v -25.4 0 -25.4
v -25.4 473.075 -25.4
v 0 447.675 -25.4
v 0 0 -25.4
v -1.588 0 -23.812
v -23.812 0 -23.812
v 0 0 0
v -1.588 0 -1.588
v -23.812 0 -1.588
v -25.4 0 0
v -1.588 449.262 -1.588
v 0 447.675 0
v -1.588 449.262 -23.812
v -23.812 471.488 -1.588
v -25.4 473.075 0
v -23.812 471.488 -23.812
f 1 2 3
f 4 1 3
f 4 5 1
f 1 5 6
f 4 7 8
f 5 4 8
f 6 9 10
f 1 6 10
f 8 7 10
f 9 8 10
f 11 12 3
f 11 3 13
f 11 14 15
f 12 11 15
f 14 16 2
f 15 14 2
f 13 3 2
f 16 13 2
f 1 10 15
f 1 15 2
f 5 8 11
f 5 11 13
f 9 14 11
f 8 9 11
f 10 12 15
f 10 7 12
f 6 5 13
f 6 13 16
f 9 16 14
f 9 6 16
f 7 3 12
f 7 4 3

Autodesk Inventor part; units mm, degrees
ref_plane "YZ Plane" through (0, 0, 0) normal (1, 0, 0) x (0, 1, 0)
ref_plane "XZ Plane" through (0, 0, 0) normal (0, 1, 0) x (-1, 0, 0)
ref_plane "XY Plane" through (0, 0, 0) normal (0, 0, 1) x (1, 0, 0)
sketch "Sketch1" plane through (0, 0, 0) normal (0, 1, 0) x (-1, 0, 0)
  line L0 (0, 0) -> (25.4, 0)
  line L1 (25.4, 0) -> (25.4, -25.4)
  line L2 (25.4, -25.4) -> (0, -25.4)
  line L3 (0, -25.4) -> (0, 0)
  line L4 (23.8125, -1.5875) -> (1.5875, -1.5875)
  line L5 (1.5875, -1.5875) -> (1.5875, -23.8125)
  line L6 (1.5875, -23.8125) -> (23.8125, -23.8125)
  line L7 (23.8125, -23.8125) -> (23.8125, -1.5875)
  dimension "d0" = 25.4
  dimension "d1" = 25.4
  dimension "d2" = 1.5875
extrude "Extrusion1" add sketch "Sketch1" along normal blind 473.075
chamfer "Chamfer1" distance 25.4 angle 45 1 edges at (0, 473.075, -12.7)
properties part number "SUP_001_CornerVertical" material "Aluminum 6061"
